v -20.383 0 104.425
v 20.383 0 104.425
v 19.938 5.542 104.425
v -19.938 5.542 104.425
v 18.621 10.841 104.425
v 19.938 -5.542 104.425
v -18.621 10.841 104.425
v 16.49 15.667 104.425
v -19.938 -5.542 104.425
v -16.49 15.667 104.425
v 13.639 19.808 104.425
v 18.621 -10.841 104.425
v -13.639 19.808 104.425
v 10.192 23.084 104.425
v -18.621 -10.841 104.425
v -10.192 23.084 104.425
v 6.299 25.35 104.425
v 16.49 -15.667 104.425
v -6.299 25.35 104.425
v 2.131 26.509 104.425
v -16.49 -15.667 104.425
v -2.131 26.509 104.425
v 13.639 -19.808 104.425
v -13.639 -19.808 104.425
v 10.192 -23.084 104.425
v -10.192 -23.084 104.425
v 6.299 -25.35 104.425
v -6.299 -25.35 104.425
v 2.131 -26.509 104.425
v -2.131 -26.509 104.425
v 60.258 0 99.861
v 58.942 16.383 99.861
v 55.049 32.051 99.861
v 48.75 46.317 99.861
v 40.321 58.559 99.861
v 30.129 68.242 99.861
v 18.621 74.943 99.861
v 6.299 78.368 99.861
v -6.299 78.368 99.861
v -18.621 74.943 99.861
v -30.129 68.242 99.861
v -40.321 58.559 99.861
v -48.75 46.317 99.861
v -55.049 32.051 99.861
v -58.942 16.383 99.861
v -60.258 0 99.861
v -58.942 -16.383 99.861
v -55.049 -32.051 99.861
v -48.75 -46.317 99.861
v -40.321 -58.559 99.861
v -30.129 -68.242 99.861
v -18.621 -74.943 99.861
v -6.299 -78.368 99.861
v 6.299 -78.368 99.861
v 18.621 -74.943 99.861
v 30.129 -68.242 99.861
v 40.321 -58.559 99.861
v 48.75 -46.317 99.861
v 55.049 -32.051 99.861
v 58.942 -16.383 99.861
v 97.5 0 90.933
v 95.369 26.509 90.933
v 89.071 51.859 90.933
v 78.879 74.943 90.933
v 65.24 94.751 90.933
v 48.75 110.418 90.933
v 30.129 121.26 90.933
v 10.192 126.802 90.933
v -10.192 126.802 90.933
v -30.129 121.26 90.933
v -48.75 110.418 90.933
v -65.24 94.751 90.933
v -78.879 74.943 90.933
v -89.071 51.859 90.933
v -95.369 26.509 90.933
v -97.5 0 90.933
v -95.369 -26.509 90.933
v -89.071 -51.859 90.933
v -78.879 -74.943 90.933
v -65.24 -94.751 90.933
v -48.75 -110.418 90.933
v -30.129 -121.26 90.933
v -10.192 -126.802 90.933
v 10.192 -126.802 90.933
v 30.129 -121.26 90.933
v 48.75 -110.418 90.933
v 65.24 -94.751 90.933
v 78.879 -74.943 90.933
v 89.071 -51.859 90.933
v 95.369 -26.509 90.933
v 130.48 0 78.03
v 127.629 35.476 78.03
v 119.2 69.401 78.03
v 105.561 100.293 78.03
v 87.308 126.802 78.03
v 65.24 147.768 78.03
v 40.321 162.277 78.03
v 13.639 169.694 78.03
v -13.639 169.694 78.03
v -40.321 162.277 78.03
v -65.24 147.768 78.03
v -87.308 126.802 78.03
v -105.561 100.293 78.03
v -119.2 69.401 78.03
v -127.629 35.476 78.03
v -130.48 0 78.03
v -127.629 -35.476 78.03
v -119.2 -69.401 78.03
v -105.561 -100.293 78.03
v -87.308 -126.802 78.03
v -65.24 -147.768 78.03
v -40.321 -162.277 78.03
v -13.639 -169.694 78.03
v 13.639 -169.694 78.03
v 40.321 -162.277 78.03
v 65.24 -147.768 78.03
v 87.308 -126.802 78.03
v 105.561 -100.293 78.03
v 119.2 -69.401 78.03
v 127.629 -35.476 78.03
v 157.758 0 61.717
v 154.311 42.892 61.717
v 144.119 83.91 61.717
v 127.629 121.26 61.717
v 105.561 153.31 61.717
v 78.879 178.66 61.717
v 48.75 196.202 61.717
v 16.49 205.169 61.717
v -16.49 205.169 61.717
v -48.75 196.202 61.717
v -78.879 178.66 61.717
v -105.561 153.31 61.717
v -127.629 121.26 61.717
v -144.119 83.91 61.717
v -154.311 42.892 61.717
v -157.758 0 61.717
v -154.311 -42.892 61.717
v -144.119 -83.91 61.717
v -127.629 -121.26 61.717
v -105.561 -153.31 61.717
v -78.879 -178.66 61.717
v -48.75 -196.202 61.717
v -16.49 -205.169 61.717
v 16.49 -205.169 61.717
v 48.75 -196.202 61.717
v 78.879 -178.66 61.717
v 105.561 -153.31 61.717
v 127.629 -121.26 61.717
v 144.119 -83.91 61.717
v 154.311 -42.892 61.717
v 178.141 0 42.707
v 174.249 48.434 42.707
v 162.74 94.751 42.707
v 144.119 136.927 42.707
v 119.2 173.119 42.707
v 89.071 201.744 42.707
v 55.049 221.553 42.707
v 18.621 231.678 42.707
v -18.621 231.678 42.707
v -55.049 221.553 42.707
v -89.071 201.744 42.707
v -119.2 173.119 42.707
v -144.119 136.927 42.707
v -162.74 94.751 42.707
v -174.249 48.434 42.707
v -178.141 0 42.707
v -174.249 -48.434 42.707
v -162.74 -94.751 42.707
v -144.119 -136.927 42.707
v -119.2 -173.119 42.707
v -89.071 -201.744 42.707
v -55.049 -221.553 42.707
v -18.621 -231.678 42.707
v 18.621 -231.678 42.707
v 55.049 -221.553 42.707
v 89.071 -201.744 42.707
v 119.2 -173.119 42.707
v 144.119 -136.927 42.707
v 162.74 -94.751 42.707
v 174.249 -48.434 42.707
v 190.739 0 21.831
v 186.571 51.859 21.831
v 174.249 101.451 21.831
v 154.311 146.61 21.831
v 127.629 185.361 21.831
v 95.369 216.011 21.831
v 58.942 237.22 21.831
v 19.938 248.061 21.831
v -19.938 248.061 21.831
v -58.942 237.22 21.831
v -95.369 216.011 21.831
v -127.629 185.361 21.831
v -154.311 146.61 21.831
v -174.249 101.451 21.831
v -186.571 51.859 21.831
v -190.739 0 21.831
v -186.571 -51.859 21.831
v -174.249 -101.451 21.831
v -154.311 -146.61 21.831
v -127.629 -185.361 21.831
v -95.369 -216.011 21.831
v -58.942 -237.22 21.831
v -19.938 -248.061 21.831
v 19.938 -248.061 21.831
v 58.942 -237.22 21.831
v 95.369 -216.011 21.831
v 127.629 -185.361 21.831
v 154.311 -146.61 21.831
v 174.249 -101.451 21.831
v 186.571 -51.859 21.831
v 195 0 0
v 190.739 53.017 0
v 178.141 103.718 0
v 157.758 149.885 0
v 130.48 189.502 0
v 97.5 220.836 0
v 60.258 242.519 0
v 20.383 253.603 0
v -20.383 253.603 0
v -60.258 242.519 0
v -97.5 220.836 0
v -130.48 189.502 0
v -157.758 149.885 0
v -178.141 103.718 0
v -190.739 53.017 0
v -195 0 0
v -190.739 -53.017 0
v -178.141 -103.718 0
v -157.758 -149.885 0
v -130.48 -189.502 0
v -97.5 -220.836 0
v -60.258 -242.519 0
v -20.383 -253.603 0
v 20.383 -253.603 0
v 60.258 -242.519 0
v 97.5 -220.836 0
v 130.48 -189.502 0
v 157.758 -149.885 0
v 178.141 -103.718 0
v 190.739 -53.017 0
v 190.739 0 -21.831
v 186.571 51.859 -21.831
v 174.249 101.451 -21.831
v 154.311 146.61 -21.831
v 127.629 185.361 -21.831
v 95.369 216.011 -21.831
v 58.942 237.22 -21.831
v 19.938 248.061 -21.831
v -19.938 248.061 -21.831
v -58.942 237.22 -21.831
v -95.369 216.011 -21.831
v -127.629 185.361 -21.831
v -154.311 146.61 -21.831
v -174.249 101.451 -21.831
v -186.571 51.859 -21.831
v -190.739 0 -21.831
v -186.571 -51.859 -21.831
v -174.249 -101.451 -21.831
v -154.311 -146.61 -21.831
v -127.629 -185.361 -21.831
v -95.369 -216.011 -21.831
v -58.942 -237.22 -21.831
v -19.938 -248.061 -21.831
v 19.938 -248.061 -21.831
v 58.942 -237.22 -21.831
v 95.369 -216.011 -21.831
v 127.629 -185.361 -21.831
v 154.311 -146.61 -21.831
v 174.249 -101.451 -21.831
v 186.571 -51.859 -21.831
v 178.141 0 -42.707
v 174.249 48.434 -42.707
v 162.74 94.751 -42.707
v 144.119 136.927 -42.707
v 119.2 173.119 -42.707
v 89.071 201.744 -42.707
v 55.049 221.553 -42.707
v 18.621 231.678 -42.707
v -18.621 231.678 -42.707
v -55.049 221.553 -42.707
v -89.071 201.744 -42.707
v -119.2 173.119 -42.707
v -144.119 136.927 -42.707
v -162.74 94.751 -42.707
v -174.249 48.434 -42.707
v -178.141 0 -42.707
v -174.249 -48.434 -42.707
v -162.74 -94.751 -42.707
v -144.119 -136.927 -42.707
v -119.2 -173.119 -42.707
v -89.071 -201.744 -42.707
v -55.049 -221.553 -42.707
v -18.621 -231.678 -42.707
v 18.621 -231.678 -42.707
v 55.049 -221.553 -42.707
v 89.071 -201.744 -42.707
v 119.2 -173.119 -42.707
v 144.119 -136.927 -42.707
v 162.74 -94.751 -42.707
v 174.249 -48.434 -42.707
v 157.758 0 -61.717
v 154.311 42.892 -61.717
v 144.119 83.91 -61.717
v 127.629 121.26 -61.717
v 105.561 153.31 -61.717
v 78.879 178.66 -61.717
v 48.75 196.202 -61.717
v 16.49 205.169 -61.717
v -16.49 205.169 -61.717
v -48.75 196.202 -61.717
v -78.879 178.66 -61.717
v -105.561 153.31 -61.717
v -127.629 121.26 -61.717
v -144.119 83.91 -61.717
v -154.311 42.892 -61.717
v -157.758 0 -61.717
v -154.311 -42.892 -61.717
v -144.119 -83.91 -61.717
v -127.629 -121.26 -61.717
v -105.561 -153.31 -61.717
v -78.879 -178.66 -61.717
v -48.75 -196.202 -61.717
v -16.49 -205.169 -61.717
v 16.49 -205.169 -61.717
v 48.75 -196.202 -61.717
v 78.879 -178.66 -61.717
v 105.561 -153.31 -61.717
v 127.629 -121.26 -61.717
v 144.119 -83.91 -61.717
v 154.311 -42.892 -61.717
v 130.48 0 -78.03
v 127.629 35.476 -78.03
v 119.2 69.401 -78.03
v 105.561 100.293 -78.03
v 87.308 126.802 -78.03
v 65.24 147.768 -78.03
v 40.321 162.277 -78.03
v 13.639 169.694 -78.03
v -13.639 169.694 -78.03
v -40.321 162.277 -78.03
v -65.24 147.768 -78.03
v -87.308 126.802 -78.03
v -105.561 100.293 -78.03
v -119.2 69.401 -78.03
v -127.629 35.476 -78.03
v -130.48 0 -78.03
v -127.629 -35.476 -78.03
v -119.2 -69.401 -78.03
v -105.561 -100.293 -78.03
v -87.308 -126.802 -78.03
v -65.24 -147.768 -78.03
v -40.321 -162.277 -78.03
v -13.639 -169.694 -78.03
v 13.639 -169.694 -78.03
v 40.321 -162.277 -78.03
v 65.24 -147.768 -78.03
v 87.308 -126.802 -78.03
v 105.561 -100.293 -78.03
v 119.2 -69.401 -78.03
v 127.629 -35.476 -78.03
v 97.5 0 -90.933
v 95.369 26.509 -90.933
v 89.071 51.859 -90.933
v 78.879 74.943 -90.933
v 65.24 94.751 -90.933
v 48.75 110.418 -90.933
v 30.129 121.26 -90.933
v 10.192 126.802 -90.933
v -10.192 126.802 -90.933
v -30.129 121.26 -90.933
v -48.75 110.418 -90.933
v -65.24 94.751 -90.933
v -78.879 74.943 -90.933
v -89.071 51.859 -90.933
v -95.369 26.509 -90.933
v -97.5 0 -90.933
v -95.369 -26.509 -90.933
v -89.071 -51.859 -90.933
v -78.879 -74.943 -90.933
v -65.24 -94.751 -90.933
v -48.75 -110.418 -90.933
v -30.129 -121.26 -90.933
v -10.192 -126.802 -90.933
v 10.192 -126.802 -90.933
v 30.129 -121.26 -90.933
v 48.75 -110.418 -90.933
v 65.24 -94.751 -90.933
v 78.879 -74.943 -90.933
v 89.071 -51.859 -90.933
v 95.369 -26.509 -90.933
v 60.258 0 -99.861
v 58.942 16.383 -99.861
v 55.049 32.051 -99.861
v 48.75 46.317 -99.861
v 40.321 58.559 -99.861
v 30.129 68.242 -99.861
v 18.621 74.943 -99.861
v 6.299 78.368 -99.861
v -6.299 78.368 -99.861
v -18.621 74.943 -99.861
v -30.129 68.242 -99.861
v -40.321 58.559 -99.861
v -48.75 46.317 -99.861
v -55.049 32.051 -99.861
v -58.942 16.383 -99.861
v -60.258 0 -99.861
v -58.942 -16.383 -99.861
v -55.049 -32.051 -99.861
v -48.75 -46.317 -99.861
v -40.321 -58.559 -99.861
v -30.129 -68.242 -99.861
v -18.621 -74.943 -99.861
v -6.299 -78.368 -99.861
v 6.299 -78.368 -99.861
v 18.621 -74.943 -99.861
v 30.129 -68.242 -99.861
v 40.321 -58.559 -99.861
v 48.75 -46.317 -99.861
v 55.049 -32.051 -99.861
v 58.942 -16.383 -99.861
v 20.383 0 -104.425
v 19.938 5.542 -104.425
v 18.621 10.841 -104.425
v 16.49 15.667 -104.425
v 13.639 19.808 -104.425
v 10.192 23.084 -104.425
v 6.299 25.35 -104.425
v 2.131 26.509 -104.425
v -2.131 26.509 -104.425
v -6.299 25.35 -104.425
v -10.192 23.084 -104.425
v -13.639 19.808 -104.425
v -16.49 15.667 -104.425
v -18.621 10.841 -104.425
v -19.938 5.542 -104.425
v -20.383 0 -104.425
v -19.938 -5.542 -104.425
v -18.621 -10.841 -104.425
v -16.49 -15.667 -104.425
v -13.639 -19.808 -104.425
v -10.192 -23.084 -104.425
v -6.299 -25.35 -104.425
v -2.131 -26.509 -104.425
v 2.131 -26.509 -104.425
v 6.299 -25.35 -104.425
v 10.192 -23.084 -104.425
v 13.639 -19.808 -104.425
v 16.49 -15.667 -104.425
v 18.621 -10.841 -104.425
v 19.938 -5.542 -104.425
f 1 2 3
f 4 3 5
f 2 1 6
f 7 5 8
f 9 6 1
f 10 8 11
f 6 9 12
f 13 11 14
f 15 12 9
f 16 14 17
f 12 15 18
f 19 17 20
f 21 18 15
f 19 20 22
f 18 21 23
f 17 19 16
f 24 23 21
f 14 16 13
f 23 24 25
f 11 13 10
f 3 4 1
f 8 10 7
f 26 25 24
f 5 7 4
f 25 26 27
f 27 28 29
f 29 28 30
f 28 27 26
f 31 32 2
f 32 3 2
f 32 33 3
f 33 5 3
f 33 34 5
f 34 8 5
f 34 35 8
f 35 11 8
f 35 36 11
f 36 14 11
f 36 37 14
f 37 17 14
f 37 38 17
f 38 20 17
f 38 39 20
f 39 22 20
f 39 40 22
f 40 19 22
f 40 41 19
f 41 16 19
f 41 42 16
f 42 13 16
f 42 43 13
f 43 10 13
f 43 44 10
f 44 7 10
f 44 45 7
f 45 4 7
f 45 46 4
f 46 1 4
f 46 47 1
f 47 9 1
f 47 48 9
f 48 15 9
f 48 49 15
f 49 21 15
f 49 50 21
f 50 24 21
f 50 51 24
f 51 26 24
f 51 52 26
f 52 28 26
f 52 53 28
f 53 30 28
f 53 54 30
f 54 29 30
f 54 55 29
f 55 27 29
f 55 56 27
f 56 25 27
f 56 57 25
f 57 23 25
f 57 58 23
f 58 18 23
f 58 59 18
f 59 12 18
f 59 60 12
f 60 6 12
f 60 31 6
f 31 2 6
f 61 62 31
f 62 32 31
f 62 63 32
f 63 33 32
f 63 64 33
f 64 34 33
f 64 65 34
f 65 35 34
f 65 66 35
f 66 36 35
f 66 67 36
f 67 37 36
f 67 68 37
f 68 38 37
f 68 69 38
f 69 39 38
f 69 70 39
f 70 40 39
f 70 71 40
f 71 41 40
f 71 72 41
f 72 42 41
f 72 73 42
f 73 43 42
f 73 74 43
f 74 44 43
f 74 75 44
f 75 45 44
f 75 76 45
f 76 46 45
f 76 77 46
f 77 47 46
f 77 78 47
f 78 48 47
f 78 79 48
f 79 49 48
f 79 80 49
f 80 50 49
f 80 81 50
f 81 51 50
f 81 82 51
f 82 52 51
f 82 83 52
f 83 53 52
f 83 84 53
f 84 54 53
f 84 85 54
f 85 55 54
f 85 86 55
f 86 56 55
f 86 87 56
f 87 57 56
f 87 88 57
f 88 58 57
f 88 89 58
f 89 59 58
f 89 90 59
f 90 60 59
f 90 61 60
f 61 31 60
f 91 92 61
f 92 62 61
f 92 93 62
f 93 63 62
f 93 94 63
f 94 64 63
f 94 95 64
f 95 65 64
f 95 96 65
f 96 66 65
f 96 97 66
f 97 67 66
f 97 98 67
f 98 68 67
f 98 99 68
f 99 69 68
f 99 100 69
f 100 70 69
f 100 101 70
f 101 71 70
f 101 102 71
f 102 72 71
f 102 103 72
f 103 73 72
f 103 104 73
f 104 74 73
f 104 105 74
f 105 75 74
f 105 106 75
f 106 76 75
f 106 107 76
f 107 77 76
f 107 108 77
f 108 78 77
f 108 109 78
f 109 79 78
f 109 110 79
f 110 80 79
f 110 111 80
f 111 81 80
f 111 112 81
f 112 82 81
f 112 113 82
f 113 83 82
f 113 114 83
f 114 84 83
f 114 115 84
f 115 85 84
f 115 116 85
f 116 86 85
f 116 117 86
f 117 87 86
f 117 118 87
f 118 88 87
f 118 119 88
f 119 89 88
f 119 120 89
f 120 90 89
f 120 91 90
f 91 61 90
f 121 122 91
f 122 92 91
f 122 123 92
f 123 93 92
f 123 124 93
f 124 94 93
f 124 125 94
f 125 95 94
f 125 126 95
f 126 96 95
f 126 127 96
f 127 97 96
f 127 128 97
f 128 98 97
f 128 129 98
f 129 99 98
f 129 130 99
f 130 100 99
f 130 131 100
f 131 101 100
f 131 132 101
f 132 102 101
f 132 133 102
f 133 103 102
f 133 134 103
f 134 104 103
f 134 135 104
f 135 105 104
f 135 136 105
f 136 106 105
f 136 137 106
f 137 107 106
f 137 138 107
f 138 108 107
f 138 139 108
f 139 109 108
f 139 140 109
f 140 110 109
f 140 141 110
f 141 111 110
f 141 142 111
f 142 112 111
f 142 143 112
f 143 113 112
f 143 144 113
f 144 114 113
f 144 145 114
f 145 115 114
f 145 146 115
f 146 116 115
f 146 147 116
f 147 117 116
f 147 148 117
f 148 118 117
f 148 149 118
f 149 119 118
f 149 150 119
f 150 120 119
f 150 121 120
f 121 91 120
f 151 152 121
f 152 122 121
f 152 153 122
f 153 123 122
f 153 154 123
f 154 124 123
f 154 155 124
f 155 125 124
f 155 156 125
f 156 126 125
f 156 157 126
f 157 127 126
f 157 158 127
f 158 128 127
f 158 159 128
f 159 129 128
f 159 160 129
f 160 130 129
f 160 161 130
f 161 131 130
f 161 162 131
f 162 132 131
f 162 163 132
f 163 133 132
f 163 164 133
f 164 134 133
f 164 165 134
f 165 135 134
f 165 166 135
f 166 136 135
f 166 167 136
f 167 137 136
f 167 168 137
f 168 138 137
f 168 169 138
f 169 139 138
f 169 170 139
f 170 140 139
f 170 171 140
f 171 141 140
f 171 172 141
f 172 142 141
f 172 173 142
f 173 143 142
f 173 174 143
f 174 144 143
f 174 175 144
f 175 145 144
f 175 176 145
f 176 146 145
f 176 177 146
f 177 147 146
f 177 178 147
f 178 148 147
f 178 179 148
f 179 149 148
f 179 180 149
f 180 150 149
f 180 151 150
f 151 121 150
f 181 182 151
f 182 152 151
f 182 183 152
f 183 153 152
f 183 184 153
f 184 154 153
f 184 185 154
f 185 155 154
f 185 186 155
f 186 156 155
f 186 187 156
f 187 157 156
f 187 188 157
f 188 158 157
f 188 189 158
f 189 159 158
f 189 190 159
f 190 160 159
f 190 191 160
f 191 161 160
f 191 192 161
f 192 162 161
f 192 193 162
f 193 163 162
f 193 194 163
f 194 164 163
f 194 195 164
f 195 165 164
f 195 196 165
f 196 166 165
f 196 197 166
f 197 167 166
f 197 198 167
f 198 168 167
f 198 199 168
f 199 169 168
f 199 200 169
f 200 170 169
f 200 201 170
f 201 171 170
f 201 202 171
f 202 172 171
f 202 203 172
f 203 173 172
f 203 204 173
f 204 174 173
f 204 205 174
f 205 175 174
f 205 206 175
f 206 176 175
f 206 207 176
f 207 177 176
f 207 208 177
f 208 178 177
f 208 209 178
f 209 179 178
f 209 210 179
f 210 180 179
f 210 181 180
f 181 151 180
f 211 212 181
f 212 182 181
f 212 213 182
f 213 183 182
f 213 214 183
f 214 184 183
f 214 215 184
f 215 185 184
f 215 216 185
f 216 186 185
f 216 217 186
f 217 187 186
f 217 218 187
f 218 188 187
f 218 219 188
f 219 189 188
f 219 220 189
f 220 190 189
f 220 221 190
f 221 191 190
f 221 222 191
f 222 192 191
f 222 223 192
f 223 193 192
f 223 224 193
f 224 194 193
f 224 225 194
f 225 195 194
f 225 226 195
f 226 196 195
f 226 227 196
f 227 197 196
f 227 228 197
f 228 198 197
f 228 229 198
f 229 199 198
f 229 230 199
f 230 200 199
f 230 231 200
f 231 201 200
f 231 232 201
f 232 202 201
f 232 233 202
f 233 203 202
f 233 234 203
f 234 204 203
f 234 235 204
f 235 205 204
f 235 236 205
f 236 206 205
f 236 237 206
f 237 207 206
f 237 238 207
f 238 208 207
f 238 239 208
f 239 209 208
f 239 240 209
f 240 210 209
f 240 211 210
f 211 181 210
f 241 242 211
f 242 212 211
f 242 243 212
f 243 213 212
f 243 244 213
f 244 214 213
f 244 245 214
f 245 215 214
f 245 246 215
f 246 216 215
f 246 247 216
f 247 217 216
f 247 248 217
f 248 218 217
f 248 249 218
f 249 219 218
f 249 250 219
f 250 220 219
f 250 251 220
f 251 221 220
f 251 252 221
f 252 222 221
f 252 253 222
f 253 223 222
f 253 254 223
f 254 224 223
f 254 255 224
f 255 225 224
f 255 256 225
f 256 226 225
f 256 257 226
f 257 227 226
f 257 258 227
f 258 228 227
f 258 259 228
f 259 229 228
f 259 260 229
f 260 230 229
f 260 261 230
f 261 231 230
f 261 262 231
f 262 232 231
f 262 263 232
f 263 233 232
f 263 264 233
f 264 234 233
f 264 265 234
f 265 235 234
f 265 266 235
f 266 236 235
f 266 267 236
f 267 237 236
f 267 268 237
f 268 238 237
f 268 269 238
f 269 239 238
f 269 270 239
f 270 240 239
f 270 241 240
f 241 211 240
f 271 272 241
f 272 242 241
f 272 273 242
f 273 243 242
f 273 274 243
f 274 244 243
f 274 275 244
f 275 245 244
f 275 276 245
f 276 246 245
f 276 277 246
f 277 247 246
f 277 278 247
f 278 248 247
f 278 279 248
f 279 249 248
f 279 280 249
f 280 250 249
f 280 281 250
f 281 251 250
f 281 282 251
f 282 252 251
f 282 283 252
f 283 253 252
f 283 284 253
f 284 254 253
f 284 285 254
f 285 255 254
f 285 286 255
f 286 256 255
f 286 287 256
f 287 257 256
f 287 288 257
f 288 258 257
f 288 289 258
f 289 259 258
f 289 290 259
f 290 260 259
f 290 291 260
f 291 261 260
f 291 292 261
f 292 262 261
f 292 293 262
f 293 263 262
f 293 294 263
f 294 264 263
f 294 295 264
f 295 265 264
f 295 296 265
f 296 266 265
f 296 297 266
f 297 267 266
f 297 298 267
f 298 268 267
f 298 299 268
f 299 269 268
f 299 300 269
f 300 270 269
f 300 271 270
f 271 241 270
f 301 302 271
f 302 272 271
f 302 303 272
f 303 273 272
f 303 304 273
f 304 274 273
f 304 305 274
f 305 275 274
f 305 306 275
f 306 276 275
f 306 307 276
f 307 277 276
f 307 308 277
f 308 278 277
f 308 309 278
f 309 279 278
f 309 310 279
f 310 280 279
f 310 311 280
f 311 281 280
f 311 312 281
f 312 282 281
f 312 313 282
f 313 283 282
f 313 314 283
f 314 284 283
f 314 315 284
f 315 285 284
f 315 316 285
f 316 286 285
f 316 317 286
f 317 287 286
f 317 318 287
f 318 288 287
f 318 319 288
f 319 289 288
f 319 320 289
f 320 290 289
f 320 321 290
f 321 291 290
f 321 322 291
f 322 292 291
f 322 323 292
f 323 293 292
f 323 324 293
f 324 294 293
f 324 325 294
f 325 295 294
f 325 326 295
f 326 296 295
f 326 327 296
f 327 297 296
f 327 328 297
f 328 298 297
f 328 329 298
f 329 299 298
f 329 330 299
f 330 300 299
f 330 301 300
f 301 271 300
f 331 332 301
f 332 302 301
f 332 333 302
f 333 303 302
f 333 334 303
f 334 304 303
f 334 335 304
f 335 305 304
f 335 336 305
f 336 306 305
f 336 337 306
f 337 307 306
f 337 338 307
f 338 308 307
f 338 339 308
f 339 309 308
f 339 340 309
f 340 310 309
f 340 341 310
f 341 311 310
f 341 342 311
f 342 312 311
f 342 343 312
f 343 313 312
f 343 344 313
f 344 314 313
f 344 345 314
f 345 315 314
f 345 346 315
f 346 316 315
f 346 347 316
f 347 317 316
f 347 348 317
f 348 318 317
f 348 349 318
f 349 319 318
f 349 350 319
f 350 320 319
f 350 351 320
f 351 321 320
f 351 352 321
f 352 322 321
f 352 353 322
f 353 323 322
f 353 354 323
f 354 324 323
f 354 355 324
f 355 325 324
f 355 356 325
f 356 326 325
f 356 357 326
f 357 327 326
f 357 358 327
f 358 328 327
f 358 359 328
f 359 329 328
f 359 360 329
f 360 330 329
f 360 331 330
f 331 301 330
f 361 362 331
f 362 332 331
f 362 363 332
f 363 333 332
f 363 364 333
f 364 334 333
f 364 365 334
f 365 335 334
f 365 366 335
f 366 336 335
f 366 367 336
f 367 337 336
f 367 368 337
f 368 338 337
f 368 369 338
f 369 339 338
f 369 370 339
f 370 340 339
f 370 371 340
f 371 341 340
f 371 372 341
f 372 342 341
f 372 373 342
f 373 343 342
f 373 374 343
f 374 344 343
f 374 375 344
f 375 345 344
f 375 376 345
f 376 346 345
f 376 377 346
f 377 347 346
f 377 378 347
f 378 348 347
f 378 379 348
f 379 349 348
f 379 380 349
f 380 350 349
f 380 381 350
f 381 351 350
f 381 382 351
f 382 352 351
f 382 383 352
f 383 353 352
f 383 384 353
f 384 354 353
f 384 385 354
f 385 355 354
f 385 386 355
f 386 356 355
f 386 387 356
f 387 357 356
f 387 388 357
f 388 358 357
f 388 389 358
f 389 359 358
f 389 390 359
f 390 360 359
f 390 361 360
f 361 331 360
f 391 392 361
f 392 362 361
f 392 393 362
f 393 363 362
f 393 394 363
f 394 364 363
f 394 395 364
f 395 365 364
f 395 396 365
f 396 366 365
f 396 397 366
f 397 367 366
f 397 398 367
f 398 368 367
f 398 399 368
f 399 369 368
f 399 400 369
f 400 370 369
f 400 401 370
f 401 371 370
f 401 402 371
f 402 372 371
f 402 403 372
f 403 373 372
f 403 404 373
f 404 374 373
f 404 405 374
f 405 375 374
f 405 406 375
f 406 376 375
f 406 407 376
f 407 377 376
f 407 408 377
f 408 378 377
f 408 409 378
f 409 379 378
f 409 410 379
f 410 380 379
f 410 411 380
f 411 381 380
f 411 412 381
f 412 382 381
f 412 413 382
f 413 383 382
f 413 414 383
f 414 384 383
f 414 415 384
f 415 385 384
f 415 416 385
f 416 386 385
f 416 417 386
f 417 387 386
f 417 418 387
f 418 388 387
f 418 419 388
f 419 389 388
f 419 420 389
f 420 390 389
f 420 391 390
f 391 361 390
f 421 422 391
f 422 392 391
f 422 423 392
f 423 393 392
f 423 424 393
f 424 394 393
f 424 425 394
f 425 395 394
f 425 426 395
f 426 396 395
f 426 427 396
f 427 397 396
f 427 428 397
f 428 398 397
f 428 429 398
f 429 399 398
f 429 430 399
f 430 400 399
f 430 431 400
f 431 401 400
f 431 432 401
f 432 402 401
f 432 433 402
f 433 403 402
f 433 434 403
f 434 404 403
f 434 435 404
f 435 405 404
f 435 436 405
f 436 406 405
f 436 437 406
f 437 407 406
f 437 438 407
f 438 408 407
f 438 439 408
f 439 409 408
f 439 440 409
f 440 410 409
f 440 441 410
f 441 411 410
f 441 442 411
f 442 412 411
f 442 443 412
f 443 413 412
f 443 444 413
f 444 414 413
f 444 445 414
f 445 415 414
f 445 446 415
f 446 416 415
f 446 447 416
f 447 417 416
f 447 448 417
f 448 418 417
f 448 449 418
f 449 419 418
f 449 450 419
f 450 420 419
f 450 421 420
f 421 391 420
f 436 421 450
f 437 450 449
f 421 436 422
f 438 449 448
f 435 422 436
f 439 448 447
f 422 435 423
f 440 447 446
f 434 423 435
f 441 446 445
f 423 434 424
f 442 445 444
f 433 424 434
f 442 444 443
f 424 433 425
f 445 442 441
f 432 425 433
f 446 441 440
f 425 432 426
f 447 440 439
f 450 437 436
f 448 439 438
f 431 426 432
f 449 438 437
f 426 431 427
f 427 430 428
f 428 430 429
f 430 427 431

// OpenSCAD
// Generated by SolidPython 1.0.1 on 2020-07-29 00:46:51


scale(v = [13, 17, 7]) {
	sphere(r = 15);
}
/***********************************************
*********      SolidPython code:      **********
************************************************
 
# import packages: SolidPython
from solid import *
from solid.utils import *
from itertools import chain, combinations, permutations


class Resize:

    def __init__(self, scad_file):
        self.scad_file = scad_file
        #self.scad_file = import_scad(scad_file)
        # cone/cylinder param:
        self.r1 = 0
        self.r2 = 0
        self.h = 0
        # rectangular prism param:
        self.w = 0
        self.l = 0
        # ellipse param:
        self.r = 0

    # import OpenScad code (file name corresponds to shape)


    # classify shape + parameters
    def assign(self, param1, param2, param3):
        if self.scad_file == 'cone.scad':
            self.r1 = param1
            self.r2 = param2
            self.h = param3
        elif self.scad_file == 'cylinder.scad':
            self.r1 = param1
            self.r2 = param2
            self.h = param3
        elif self.scad_file == 'rectangularPrism.scad':
            self.h = param1
            self.l = param2
            self.w = param3
        else:
            self.r = param1
            self.h = param2

    # resize parameters
    def iterate(self):
        x = range(3, 20, 2)
        i = 1
        if self.scad_file == 'cone.scad':
            tempList = list(permutations(x, 2))
            for temp in tempList:
                param1 = temp[0]
                param2 = temp[1]
                filepath = 'produced_scad_files/' + 'cone' + str(param1) + '_' + str(param2) + '_' + '.scad'
                scad_render_to_file(cylinder(h=param1, r1=param2, r2=0), filepath)

        elif self.scad_file == 'cylinder.scad':
            tempList = list(permutations(x, 3))
            for temp in tempList:
                param1 = temp[0]
                param2 = temp[1]
                filepath = 'produced_scad_files/' + 'cylinder' + str(param1) + '_' + str(param2) + '_' + '.scad'
                scad_render_to_file(cylinder(h=param1, r1=param2, r2=param2), filepath)

        elif self.scad_file == 'rectangularPrism.scad':
            tempList = list(permutations(x, 3))
            for temp in tempList:
                param1 = temp[0]
                param2 = temp[1]
                param3 = temp[2]
                filepath = 'produced_scad_files/' + 'rectangularPrism' + str(param1) + '_' + str(param2) + '_' + str(
                    param3) + '.scad'
                scad_render_to_file(cube(size=(param1, param2, param3)), filepath)

        elif self.scad_file == 'ellipse.scad':
            tempList = list(permutations(x, 4))
            for temp in tempList:
                param1 = temp[0]
                param2 = temp[1]
                param3 = temp[2]
                param4 = temp[3]
                filepath = 'produced_scad_files/' + 'ellipse' + str(param1) + '_' + str(param2) + '_' + str(param3) + '_' + str(param4) + '.scad'
                scad_render_to_file(scale([param1, param2, param3])(sphere(r=param4)), filepath)

    def render_to_scadfile(self):
        scad_render_to_file(scad, 'example.scad') 
 
************************************************/
